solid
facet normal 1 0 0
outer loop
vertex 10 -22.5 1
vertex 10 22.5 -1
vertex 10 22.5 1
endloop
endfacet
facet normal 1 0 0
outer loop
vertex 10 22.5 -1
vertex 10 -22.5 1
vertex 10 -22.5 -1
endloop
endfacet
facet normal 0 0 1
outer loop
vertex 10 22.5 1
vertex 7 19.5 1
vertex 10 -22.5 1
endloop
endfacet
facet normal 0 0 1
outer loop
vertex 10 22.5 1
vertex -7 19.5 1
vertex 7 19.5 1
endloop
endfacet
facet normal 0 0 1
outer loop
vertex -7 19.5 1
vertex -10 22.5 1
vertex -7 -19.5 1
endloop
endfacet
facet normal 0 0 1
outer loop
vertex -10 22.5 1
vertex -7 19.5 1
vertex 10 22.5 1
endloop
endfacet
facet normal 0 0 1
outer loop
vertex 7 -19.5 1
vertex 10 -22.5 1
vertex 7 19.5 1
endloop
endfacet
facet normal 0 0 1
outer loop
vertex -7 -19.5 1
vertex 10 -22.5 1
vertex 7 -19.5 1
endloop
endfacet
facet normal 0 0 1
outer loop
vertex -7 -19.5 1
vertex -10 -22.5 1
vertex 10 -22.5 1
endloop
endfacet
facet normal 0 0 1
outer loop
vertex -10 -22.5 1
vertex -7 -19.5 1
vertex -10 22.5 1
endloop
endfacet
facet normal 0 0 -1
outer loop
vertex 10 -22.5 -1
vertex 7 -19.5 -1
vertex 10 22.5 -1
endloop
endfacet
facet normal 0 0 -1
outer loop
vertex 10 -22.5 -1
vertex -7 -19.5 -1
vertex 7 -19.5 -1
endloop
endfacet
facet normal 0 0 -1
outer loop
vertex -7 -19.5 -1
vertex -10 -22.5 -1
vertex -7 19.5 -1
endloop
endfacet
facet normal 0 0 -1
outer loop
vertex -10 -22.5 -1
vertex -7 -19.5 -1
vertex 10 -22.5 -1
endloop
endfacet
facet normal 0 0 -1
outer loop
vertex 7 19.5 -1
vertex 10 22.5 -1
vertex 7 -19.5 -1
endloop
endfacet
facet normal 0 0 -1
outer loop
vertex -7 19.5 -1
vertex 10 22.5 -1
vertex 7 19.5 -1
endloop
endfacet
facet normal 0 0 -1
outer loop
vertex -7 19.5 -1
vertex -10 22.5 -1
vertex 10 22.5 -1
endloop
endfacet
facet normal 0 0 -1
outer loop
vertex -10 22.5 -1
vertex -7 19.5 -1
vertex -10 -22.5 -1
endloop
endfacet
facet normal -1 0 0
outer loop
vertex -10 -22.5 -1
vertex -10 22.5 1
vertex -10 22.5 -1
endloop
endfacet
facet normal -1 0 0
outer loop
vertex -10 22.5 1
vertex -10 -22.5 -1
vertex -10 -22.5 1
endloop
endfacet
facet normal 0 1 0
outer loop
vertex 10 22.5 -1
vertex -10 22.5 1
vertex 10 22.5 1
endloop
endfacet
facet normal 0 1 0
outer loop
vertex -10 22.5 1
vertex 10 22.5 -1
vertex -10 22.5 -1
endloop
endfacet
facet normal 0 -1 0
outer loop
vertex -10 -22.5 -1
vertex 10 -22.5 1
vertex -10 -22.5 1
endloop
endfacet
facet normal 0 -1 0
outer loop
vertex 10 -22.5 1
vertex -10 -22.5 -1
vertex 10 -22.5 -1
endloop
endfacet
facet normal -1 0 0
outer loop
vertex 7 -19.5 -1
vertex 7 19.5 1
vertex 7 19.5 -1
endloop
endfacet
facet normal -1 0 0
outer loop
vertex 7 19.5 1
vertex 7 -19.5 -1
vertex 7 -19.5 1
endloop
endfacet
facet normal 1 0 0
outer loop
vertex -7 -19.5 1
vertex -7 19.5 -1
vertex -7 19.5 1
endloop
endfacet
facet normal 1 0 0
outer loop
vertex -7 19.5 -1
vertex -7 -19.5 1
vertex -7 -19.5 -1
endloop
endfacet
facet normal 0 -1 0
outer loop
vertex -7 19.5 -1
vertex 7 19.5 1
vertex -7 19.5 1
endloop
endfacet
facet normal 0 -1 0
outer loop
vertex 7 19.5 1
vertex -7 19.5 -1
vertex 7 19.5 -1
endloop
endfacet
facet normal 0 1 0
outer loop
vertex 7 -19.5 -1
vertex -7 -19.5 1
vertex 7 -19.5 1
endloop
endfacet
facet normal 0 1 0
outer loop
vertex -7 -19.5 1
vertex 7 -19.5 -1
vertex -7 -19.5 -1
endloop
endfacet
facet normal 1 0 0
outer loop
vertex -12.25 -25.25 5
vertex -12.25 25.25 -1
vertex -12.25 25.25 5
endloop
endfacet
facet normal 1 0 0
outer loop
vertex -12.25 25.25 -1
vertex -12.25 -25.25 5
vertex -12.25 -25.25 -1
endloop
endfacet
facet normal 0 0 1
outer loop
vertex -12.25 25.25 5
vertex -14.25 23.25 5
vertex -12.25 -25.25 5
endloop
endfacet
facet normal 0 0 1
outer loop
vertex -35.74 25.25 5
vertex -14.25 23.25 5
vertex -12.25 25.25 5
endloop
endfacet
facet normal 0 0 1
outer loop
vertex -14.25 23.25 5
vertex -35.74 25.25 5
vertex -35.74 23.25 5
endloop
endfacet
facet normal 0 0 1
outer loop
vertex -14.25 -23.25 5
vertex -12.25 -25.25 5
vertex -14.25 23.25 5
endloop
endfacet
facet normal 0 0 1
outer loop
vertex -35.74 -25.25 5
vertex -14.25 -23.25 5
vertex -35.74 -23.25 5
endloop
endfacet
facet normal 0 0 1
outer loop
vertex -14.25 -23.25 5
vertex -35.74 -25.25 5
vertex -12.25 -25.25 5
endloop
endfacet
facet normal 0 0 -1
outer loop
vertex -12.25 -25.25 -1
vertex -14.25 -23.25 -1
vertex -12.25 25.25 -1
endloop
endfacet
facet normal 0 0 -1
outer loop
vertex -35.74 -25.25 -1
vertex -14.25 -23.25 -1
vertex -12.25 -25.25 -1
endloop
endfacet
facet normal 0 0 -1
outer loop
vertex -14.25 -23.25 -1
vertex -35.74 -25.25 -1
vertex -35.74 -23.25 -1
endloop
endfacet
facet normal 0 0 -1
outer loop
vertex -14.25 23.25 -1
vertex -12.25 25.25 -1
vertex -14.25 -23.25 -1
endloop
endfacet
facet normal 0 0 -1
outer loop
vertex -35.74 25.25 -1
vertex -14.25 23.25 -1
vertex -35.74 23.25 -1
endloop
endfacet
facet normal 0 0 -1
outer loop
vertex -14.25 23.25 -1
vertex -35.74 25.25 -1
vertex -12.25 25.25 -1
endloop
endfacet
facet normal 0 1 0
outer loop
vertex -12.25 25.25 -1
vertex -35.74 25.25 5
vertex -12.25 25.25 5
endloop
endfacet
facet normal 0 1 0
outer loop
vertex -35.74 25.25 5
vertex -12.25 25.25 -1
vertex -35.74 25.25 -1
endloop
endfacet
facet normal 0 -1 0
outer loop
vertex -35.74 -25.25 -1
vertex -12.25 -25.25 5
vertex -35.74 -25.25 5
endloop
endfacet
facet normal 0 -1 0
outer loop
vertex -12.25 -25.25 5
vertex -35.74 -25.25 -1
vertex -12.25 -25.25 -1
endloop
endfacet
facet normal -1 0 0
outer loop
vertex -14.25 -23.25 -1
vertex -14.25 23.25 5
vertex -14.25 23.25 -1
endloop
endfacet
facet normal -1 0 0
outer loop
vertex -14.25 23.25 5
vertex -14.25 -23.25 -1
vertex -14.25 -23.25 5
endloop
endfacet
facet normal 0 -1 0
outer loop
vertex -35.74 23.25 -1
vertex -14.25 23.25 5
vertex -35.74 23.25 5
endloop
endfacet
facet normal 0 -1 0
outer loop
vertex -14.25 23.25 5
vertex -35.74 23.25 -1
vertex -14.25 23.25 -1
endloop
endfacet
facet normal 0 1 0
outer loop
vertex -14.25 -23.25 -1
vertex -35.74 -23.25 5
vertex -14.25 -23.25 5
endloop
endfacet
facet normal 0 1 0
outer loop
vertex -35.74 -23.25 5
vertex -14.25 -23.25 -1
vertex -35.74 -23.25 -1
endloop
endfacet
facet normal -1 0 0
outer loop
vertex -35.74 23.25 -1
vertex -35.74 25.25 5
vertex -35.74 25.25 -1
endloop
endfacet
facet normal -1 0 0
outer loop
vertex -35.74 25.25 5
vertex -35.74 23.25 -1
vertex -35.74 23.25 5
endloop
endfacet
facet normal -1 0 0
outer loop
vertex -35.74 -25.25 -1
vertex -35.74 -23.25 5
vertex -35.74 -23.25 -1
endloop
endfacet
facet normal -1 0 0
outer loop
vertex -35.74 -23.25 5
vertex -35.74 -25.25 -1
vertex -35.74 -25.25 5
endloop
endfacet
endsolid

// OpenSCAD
w_back = 70;
h_back = 45;
w_controller = 20;
thickness_bottom = 2;
thickness_walls = 2;
h_walls = 4;
gap_backlight = 1.5;
thickness_top = 2;
thickness_back = 1;
width_frame_window = 3;

//kit_controller();
//walls();
//debug_controller();
test_print_walls_frame();

module test_print_walls_frame(){
    frame_controller();
    translate([-w_controller-width_frame_window-2, 0, h_walls/2])
    walls();
}

module frame_controller(){
difference(){
    cube([w_controller, h_back, thickness_top], center = true);
    color("red")
    cube([w_controller-2*width_frame_window, h_back-2*width_frame_window, thickness_top+1], center = true);
}
}

module debug_controller() {
    difference(){
        kit_controller();
        translate([-w_controller/2, 0, h_walls/2])
        color("green")
        cube([w_controller, h_back+2*thickness_walls+1+gap_backlight, h_walls*2], center = true);
    }
}


module kit_controller(){
    controller();
    translate([0, 0, h_walls/2])
    walls();
    color("green")
    translate([0, 0, thickness_bottom+0.1])
    frame_controller();
}
module walls(){
    difference(){
        cube([w_controller+2*thickness_walls+gap_backlight, h_back+2*thickness_walls+gap_backlight, thickness_bottom+h_walls], center=true);
        color("red")
        cube([w_controller+gap_backlight, h_back+gap_backlight, thickness_bottom+h_walls+1], center=true);
        translate([-w_controller-thickness_walls+gap_backlight/2-0.24, 0, 0])
        color("red")
        cube([w_controller+gap_backlight, h_back+gap_backlight+2*thickness_walls+1, thickness_bottom+h_walls+1], center=true);
    }
}

module controller(){
    cube([w_controller+gap_backlight, h_back+gap_backlight, thickness_bottom], center=true);
}
